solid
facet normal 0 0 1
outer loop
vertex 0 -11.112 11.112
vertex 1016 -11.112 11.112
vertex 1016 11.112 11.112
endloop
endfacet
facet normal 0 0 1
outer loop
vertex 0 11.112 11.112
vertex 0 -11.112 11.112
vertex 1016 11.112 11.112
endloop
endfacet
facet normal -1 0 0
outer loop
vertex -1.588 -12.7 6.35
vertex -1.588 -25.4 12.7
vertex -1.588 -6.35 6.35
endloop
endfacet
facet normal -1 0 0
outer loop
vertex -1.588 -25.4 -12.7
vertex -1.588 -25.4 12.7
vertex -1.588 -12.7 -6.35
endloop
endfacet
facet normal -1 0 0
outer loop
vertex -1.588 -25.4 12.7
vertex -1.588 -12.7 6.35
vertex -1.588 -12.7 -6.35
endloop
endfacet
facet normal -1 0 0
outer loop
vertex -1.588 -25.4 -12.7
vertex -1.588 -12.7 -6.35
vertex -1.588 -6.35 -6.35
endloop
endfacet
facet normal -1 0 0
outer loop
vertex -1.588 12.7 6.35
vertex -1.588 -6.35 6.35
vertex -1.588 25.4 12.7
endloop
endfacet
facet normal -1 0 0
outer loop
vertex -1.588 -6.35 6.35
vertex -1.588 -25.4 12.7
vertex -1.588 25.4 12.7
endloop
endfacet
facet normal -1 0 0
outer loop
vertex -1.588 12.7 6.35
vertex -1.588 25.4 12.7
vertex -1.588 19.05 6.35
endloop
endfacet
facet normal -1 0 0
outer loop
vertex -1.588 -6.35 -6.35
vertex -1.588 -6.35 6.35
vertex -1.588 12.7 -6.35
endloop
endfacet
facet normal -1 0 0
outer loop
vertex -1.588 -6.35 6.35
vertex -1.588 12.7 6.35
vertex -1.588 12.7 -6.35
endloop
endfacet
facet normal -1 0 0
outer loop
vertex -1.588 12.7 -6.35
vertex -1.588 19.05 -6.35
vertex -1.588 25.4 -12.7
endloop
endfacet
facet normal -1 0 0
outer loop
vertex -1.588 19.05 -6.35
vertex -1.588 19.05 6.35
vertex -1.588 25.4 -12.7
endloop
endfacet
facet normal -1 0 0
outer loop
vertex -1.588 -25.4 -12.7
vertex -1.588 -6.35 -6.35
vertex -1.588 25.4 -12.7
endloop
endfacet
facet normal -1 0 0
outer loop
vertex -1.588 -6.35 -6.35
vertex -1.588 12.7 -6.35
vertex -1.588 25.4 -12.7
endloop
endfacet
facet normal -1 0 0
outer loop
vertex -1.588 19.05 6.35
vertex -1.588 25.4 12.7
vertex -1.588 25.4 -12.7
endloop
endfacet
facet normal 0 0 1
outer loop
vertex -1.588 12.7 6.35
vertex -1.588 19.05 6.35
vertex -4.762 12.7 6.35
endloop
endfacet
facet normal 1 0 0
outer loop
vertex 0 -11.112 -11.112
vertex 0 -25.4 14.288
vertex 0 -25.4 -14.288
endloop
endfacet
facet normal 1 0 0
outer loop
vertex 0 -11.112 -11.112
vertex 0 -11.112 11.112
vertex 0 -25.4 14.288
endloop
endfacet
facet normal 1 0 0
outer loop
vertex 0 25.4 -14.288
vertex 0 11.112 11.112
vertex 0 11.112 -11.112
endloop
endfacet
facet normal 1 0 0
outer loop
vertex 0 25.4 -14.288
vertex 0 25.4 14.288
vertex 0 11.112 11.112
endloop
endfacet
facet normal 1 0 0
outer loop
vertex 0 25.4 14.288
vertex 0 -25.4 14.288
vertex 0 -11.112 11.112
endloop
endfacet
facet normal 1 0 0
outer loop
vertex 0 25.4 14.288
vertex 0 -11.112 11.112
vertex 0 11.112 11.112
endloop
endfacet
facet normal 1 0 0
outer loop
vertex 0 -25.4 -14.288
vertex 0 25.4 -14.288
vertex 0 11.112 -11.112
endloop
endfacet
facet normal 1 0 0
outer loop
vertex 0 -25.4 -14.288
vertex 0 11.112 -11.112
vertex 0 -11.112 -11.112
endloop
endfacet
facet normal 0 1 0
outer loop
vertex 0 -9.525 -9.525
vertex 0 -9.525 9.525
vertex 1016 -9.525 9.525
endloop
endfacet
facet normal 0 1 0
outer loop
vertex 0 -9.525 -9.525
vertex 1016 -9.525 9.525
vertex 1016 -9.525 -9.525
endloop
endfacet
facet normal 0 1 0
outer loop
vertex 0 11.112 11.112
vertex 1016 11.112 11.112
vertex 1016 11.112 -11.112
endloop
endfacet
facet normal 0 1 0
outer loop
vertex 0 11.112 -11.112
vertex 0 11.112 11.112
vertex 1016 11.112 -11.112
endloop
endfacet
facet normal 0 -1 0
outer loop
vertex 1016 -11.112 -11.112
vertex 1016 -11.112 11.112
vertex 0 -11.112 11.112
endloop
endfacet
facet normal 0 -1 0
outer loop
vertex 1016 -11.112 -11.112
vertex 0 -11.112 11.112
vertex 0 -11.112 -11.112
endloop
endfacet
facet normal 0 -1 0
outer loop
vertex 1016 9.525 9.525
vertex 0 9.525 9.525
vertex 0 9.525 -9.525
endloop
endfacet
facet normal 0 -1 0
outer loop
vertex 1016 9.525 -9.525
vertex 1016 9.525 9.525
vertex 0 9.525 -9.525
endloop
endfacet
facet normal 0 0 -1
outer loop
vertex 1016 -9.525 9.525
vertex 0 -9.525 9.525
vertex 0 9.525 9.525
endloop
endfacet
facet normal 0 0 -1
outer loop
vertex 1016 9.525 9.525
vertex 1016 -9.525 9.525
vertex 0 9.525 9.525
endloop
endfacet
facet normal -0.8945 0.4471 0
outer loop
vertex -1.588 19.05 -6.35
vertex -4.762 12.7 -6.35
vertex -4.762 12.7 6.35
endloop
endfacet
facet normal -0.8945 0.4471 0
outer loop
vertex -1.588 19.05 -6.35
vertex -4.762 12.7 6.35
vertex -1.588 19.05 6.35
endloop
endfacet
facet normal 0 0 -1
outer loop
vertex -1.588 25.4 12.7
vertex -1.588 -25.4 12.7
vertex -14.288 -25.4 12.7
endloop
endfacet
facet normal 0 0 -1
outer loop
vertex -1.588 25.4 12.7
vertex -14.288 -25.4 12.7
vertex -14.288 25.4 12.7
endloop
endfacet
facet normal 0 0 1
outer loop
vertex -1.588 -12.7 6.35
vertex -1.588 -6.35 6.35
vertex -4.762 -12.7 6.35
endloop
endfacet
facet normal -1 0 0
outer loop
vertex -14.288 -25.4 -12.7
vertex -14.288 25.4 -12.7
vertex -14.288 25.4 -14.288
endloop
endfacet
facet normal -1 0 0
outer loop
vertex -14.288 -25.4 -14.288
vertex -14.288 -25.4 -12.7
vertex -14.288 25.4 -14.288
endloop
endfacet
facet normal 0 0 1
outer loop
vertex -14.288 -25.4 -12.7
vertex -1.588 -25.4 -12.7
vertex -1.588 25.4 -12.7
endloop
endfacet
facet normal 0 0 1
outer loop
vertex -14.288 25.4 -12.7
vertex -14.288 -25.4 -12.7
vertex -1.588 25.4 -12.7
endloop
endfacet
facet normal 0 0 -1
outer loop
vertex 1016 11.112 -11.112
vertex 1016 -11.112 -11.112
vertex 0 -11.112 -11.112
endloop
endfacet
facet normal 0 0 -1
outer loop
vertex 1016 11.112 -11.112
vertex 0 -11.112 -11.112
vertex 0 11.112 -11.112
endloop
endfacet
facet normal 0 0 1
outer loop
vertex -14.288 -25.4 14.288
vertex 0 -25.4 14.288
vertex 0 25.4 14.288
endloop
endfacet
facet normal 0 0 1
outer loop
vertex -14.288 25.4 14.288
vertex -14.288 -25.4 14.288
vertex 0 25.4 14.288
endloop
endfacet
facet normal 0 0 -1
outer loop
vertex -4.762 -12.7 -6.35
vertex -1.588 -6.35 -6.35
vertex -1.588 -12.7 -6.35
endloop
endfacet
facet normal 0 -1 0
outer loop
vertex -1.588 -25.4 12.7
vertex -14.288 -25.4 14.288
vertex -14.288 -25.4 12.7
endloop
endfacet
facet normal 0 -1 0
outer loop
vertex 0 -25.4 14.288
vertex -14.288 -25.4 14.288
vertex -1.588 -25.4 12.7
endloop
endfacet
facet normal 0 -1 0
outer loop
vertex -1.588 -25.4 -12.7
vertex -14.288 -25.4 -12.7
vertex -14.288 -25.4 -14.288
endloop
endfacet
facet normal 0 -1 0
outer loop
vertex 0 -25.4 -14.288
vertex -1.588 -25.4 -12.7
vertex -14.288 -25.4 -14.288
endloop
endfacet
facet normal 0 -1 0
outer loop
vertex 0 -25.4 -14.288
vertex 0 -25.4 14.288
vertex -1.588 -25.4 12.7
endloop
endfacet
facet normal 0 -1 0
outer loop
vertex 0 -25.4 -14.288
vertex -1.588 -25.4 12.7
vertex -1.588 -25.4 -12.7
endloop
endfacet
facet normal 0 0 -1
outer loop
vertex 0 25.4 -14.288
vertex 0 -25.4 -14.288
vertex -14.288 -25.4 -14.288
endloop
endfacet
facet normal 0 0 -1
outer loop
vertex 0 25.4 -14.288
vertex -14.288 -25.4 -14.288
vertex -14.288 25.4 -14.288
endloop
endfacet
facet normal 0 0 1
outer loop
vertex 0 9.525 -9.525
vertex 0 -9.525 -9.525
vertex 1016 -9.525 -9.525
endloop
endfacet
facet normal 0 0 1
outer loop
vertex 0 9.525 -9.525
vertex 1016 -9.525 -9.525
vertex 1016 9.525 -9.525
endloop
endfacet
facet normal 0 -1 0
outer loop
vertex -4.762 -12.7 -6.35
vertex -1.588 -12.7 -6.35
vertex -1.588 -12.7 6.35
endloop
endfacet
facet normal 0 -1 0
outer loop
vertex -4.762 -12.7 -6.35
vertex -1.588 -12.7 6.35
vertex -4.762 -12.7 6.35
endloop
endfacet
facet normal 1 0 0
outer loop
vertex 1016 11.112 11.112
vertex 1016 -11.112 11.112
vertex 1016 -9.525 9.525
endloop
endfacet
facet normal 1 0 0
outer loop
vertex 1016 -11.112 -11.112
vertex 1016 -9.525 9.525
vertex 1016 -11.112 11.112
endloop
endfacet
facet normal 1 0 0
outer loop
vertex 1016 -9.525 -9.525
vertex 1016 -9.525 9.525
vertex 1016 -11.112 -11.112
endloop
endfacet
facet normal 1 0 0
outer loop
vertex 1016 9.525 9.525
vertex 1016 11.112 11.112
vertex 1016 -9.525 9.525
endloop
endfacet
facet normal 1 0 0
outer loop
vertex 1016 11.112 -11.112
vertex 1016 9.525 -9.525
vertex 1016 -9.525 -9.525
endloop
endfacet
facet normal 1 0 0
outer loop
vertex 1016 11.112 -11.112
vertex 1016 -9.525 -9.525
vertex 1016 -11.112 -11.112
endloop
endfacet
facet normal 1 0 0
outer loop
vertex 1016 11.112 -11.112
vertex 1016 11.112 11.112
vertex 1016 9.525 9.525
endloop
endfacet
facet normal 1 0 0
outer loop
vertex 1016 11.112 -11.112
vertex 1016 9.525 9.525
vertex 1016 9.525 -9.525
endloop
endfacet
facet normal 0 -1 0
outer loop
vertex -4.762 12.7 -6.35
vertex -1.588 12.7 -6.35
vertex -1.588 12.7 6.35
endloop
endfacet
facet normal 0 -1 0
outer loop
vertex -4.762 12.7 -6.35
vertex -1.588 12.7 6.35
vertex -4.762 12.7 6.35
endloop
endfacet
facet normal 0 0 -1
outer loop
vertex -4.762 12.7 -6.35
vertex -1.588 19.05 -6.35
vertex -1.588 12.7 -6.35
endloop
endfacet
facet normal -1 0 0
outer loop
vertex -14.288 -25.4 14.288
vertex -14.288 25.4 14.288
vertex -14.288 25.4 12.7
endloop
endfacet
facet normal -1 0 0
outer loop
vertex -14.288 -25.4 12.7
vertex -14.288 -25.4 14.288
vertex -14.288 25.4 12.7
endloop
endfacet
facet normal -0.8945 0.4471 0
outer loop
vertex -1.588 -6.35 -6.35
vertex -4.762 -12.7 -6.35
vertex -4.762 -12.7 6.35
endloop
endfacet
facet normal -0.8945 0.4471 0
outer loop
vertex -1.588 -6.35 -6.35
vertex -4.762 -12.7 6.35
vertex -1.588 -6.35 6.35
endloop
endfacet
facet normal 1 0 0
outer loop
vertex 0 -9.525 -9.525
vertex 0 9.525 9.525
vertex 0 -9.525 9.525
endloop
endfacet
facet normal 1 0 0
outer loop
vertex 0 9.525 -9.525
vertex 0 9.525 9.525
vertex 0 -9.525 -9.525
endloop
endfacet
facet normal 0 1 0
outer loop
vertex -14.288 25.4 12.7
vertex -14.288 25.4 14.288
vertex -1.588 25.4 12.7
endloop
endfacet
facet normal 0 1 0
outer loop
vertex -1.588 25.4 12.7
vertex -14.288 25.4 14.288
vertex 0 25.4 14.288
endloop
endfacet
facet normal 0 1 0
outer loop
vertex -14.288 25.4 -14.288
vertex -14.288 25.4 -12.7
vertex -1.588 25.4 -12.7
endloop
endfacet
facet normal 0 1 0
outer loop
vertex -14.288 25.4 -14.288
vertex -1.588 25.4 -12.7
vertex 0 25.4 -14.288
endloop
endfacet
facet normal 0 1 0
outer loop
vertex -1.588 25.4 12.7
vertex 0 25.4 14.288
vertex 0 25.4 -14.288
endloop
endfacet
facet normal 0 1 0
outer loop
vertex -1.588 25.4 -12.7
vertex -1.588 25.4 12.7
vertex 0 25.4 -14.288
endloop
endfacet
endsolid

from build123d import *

# Parameters (mm, degrees)
SKETCH1_W           = 28.575
SKETCH1_H           = 50.8
BOSS_EXTRUDE1_DEPTH = 1.5875
SKETCH1_3_W         = 1.5875
SKETCH1_3_H         = 50.8
BOSS_EXTRUDE2_DEPTH = 14.2875
SKETCH1_4_W         = 22.225
SKETCH1_4_H         = 22.225
SKETCH1_4_W_2       = 19.05
SKETCH1_4_H_2       = 19.05
BOSS_EXTRUDE3_DEPTH = 1016
BOSS_EXTRUDE4_DEPTH = 12.7
LPATTERN1_COUNT     = 2
LPATTERN1_PITCH     = 25.4


with BuildPart() as part:
    # Sketch1 → Boss-Extrude1 (new body)
    with BuildSketch(Plane(origin=(0, 0, 0), x_dir=(0, 0, -1), z_dir=(1, 0, 0))):
        Rectangle(SKETCH1_W, SKETCH1_H)
    extrude(amount=-BOSS_EXTRUDE1_DEPTH)

    # Sketch1<3> → Boss-Extrude2 (add)
    with BuildSketch(Plane(origin=(0, 0, 0), x_dir=(0, 0, -1), z_dir=(1, 0, 0))):
        with Locations((-13.49375, 0)):
            Rectangle(SKETCH1_3_W, SKETCH1_3_H)
        with Locations((13.49375, 0)):
            Rectangle(SKETCH1_3_W, SKETCH1_3_H)
    extrude(amount=-BOSS_EXTRUDE2_DEPTH)

    # Sketch1<4> → Boss-Extrude3 (add)
    with BuildSketch(Plane(origin=(0, 0, 0), x_dir=(0, 0, -1), z_dir=(1, 0, 0))):
        Rectangle(SKETCH1_4_W, SKETCH1_4_H)
        Rectangle(SKETCH1_4_W_2, SKETCH1_4_H_2, mode=Mode.SUBTRACT)
    extrude(amount=BOSS_EXTRUDE3_DEPTH)

    # 3DSketch1 → Boss-Extrude4 (add)
    with BuildSketch(Plane(origin=(-1.5875, 12.7, -6.35), x_dir=(0, 1, 0), z_dir=(0, 0, 1))):
        Polygon((0, 0), (0, 3.175), (6.35, 0), align=None)
    boss_extrude4 = extrude(amount=BOSS_EXTRUDE4_DEPTH)

    # LPattern1: Boss-Extrude4 ×2
    with Locations(*[(0, -i * LPATTERN1_PITCH, 0) for i in range(1, LPATTERN1_COUNT)]):
        add(boss_extrude4)


solid = part.part
